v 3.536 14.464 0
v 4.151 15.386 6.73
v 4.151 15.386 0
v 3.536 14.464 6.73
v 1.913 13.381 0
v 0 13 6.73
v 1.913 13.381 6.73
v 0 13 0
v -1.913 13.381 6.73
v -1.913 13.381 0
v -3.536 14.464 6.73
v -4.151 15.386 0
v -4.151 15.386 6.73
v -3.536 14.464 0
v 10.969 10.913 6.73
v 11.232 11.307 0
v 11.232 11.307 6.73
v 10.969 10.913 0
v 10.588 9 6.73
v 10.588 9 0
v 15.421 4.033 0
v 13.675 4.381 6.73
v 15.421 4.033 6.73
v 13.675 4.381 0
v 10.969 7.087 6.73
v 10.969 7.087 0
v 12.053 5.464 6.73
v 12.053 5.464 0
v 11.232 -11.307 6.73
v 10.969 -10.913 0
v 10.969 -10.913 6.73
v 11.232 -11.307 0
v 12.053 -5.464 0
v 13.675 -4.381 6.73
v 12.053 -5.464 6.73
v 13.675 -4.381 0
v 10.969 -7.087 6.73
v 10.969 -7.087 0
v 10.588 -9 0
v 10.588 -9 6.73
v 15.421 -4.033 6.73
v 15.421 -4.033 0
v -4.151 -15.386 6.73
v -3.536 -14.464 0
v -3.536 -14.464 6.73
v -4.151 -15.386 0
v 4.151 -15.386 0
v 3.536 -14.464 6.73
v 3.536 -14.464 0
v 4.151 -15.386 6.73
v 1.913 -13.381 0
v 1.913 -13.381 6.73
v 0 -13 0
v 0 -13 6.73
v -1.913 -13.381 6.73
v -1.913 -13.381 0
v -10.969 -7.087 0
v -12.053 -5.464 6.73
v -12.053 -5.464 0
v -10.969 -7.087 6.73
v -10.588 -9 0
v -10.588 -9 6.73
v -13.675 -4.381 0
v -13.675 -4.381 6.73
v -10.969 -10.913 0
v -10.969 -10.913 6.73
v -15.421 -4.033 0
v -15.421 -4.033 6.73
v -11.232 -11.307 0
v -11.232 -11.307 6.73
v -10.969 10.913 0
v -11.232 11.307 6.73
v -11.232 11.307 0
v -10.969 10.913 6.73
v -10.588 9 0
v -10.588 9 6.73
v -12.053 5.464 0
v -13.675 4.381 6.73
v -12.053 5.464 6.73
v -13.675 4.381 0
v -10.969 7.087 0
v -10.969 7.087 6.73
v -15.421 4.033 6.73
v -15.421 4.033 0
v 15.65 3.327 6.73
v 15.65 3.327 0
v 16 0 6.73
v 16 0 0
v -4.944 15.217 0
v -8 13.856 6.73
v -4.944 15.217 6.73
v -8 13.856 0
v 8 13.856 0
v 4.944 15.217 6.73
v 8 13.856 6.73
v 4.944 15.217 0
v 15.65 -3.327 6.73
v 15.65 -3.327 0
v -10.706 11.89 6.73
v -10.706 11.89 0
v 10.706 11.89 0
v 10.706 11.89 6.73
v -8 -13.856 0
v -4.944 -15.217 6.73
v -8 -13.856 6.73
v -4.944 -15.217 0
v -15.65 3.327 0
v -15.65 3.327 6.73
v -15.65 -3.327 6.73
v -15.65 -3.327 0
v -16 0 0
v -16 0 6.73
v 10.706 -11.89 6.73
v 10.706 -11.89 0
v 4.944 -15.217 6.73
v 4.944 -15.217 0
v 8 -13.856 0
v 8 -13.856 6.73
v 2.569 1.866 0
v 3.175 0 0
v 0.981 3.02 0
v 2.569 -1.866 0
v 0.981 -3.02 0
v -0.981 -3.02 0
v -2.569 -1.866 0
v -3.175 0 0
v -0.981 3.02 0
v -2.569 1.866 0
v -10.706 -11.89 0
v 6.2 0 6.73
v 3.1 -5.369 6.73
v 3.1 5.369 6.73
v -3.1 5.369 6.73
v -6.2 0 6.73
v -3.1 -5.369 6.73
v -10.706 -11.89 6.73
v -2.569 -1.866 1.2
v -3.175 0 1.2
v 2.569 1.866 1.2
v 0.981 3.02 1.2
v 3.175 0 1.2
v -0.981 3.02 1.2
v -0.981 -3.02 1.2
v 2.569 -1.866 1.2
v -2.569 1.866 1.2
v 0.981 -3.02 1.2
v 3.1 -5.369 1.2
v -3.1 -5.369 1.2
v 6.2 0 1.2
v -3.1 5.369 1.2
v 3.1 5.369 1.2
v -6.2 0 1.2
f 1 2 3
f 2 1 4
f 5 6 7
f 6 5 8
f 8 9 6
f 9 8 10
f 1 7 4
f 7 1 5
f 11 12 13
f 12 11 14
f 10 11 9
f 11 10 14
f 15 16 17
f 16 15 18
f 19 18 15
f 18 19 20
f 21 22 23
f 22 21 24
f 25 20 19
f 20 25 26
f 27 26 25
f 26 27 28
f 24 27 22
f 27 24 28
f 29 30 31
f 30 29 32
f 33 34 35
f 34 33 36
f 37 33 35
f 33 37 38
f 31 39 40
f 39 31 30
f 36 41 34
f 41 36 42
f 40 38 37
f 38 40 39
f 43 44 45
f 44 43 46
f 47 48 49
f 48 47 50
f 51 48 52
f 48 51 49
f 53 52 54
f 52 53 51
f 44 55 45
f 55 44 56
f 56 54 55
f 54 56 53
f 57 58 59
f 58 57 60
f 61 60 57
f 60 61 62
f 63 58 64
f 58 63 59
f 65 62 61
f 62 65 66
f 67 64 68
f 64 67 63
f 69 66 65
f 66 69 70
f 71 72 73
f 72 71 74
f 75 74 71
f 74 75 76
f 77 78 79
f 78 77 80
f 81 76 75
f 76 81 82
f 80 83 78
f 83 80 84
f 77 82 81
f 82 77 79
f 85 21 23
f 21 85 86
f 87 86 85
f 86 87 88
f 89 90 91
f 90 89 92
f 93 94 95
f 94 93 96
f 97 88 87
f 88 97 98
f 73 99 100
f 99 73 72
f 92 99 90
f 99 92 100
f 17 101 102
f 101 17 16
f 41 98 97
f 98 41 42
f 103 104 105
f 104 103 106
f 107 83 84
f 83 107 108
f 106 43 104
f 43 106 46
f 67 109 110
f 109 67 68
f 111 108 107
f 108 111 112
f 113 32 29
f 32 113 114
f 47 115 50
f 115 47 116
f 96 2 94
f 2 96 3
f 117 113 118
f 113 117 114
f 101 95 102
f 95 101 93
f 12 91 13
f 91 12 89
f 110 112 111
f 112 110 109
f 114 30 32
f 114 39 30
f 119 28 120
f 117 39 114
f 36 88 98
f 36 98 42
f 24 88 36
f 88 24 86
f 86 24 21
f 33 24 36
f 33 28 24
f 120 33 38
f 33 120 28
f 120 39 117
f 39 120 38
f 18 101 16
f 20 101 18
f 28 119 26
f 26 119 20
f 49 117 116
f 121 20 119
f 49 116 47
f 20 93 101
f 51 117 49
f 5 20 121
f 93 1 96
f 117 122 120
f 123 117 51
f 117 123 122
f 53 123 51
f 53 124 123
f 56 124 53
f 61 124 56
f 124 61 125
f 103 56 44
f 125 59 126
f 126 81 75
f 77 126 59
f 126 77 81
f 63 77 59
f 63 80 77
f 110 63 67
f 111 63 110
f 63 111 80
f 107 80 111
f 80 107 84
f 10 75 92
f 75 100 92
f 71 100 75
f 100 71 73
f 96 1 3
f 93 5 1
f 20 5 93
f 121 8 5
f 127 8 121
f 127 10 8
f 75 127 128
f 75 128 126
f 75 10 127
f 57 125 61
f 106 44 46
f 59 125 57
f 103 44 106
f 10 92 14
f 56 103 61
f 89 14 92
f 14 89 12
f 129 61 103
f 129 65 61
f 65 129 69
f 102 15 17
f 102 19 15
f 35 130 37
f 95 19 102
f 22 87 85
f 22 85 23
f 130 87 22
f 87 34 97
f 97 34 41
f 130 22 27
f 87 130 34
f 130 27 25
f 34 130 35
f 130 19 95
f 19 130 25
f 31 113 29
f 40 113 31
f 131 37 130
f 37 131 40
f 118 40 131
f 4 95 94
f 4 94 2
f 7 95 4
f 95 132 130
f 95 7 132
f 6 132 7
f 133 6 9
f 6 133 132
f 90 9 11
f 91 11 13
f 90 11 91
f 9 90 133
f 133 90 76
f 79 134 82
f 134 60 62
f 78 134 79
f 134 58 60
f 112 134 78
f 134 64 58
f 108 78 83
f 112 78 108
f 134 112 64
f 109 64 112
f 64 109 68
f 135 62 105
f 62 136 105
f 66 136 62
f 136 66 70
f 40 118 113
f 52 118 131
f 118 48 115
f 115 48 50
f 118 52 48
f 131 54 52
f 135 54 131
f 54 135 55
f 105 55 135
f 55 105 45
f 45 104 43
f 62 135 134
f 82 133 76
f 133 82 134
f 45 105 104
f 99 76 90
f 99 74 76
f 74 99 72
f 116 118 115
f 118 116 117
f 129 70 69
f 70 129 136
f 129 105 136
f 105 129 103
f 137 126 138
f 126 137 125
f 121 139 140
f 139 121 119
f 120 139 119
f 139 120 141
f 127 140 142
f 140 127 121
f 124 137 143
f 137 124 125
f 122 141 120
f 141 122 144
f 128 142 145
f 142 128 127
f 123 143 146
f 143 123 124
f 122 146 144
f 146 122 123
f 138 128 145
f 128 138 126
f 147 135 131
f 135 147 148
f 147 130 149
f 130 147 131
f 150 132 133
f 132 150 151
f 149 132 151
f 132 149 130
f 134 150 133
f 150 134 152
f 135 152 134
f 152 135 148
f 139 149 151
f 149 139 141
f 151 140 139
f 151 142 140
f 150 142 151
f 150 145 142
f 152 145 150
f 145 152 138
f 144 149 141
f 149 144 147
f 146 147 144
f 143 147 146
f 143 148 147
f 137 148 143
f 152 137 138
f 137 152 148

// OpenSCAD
/*

Parametric knob generator
by Gian Pablo Villamil
May 2011

Makes knurled knobs that accomodate a nut in the middle, useful for things
like camera mounts.

*/

knob_radius = 16;
dent_radius = 5;
knob_height = 6.73;
num_dents = 6;
dent_offset = 2;

nut_hole_radius = 3.175; // half of 1/4 inch in millimeters
nut_size_radius = 6.2; // point to point size of nut

module knob()
{
	translate([0, 0, 0]) {
		difference() {
		cylinder(h = knob_height, r = knob_radius);
		for (i = [0:(num_dents - 1)]) {
			translate([sin(360*i/num_dents)*(knob_radius+dent_offset), cos(360*i/num_dents)*(knob_radius+dent_offset), -5 ])
			cylinder(h = knob_height+10, r=dent_radius);
			}
		translate([0,0,-5]) cylinder(h = knob_height+10, r=nut_hole_radius,$fa=10);
		translate([0,0,1.2]) cylinder(h = knob_height+10, r=nut_size_radius,$fa=60);
		}
	}
}

knob();
